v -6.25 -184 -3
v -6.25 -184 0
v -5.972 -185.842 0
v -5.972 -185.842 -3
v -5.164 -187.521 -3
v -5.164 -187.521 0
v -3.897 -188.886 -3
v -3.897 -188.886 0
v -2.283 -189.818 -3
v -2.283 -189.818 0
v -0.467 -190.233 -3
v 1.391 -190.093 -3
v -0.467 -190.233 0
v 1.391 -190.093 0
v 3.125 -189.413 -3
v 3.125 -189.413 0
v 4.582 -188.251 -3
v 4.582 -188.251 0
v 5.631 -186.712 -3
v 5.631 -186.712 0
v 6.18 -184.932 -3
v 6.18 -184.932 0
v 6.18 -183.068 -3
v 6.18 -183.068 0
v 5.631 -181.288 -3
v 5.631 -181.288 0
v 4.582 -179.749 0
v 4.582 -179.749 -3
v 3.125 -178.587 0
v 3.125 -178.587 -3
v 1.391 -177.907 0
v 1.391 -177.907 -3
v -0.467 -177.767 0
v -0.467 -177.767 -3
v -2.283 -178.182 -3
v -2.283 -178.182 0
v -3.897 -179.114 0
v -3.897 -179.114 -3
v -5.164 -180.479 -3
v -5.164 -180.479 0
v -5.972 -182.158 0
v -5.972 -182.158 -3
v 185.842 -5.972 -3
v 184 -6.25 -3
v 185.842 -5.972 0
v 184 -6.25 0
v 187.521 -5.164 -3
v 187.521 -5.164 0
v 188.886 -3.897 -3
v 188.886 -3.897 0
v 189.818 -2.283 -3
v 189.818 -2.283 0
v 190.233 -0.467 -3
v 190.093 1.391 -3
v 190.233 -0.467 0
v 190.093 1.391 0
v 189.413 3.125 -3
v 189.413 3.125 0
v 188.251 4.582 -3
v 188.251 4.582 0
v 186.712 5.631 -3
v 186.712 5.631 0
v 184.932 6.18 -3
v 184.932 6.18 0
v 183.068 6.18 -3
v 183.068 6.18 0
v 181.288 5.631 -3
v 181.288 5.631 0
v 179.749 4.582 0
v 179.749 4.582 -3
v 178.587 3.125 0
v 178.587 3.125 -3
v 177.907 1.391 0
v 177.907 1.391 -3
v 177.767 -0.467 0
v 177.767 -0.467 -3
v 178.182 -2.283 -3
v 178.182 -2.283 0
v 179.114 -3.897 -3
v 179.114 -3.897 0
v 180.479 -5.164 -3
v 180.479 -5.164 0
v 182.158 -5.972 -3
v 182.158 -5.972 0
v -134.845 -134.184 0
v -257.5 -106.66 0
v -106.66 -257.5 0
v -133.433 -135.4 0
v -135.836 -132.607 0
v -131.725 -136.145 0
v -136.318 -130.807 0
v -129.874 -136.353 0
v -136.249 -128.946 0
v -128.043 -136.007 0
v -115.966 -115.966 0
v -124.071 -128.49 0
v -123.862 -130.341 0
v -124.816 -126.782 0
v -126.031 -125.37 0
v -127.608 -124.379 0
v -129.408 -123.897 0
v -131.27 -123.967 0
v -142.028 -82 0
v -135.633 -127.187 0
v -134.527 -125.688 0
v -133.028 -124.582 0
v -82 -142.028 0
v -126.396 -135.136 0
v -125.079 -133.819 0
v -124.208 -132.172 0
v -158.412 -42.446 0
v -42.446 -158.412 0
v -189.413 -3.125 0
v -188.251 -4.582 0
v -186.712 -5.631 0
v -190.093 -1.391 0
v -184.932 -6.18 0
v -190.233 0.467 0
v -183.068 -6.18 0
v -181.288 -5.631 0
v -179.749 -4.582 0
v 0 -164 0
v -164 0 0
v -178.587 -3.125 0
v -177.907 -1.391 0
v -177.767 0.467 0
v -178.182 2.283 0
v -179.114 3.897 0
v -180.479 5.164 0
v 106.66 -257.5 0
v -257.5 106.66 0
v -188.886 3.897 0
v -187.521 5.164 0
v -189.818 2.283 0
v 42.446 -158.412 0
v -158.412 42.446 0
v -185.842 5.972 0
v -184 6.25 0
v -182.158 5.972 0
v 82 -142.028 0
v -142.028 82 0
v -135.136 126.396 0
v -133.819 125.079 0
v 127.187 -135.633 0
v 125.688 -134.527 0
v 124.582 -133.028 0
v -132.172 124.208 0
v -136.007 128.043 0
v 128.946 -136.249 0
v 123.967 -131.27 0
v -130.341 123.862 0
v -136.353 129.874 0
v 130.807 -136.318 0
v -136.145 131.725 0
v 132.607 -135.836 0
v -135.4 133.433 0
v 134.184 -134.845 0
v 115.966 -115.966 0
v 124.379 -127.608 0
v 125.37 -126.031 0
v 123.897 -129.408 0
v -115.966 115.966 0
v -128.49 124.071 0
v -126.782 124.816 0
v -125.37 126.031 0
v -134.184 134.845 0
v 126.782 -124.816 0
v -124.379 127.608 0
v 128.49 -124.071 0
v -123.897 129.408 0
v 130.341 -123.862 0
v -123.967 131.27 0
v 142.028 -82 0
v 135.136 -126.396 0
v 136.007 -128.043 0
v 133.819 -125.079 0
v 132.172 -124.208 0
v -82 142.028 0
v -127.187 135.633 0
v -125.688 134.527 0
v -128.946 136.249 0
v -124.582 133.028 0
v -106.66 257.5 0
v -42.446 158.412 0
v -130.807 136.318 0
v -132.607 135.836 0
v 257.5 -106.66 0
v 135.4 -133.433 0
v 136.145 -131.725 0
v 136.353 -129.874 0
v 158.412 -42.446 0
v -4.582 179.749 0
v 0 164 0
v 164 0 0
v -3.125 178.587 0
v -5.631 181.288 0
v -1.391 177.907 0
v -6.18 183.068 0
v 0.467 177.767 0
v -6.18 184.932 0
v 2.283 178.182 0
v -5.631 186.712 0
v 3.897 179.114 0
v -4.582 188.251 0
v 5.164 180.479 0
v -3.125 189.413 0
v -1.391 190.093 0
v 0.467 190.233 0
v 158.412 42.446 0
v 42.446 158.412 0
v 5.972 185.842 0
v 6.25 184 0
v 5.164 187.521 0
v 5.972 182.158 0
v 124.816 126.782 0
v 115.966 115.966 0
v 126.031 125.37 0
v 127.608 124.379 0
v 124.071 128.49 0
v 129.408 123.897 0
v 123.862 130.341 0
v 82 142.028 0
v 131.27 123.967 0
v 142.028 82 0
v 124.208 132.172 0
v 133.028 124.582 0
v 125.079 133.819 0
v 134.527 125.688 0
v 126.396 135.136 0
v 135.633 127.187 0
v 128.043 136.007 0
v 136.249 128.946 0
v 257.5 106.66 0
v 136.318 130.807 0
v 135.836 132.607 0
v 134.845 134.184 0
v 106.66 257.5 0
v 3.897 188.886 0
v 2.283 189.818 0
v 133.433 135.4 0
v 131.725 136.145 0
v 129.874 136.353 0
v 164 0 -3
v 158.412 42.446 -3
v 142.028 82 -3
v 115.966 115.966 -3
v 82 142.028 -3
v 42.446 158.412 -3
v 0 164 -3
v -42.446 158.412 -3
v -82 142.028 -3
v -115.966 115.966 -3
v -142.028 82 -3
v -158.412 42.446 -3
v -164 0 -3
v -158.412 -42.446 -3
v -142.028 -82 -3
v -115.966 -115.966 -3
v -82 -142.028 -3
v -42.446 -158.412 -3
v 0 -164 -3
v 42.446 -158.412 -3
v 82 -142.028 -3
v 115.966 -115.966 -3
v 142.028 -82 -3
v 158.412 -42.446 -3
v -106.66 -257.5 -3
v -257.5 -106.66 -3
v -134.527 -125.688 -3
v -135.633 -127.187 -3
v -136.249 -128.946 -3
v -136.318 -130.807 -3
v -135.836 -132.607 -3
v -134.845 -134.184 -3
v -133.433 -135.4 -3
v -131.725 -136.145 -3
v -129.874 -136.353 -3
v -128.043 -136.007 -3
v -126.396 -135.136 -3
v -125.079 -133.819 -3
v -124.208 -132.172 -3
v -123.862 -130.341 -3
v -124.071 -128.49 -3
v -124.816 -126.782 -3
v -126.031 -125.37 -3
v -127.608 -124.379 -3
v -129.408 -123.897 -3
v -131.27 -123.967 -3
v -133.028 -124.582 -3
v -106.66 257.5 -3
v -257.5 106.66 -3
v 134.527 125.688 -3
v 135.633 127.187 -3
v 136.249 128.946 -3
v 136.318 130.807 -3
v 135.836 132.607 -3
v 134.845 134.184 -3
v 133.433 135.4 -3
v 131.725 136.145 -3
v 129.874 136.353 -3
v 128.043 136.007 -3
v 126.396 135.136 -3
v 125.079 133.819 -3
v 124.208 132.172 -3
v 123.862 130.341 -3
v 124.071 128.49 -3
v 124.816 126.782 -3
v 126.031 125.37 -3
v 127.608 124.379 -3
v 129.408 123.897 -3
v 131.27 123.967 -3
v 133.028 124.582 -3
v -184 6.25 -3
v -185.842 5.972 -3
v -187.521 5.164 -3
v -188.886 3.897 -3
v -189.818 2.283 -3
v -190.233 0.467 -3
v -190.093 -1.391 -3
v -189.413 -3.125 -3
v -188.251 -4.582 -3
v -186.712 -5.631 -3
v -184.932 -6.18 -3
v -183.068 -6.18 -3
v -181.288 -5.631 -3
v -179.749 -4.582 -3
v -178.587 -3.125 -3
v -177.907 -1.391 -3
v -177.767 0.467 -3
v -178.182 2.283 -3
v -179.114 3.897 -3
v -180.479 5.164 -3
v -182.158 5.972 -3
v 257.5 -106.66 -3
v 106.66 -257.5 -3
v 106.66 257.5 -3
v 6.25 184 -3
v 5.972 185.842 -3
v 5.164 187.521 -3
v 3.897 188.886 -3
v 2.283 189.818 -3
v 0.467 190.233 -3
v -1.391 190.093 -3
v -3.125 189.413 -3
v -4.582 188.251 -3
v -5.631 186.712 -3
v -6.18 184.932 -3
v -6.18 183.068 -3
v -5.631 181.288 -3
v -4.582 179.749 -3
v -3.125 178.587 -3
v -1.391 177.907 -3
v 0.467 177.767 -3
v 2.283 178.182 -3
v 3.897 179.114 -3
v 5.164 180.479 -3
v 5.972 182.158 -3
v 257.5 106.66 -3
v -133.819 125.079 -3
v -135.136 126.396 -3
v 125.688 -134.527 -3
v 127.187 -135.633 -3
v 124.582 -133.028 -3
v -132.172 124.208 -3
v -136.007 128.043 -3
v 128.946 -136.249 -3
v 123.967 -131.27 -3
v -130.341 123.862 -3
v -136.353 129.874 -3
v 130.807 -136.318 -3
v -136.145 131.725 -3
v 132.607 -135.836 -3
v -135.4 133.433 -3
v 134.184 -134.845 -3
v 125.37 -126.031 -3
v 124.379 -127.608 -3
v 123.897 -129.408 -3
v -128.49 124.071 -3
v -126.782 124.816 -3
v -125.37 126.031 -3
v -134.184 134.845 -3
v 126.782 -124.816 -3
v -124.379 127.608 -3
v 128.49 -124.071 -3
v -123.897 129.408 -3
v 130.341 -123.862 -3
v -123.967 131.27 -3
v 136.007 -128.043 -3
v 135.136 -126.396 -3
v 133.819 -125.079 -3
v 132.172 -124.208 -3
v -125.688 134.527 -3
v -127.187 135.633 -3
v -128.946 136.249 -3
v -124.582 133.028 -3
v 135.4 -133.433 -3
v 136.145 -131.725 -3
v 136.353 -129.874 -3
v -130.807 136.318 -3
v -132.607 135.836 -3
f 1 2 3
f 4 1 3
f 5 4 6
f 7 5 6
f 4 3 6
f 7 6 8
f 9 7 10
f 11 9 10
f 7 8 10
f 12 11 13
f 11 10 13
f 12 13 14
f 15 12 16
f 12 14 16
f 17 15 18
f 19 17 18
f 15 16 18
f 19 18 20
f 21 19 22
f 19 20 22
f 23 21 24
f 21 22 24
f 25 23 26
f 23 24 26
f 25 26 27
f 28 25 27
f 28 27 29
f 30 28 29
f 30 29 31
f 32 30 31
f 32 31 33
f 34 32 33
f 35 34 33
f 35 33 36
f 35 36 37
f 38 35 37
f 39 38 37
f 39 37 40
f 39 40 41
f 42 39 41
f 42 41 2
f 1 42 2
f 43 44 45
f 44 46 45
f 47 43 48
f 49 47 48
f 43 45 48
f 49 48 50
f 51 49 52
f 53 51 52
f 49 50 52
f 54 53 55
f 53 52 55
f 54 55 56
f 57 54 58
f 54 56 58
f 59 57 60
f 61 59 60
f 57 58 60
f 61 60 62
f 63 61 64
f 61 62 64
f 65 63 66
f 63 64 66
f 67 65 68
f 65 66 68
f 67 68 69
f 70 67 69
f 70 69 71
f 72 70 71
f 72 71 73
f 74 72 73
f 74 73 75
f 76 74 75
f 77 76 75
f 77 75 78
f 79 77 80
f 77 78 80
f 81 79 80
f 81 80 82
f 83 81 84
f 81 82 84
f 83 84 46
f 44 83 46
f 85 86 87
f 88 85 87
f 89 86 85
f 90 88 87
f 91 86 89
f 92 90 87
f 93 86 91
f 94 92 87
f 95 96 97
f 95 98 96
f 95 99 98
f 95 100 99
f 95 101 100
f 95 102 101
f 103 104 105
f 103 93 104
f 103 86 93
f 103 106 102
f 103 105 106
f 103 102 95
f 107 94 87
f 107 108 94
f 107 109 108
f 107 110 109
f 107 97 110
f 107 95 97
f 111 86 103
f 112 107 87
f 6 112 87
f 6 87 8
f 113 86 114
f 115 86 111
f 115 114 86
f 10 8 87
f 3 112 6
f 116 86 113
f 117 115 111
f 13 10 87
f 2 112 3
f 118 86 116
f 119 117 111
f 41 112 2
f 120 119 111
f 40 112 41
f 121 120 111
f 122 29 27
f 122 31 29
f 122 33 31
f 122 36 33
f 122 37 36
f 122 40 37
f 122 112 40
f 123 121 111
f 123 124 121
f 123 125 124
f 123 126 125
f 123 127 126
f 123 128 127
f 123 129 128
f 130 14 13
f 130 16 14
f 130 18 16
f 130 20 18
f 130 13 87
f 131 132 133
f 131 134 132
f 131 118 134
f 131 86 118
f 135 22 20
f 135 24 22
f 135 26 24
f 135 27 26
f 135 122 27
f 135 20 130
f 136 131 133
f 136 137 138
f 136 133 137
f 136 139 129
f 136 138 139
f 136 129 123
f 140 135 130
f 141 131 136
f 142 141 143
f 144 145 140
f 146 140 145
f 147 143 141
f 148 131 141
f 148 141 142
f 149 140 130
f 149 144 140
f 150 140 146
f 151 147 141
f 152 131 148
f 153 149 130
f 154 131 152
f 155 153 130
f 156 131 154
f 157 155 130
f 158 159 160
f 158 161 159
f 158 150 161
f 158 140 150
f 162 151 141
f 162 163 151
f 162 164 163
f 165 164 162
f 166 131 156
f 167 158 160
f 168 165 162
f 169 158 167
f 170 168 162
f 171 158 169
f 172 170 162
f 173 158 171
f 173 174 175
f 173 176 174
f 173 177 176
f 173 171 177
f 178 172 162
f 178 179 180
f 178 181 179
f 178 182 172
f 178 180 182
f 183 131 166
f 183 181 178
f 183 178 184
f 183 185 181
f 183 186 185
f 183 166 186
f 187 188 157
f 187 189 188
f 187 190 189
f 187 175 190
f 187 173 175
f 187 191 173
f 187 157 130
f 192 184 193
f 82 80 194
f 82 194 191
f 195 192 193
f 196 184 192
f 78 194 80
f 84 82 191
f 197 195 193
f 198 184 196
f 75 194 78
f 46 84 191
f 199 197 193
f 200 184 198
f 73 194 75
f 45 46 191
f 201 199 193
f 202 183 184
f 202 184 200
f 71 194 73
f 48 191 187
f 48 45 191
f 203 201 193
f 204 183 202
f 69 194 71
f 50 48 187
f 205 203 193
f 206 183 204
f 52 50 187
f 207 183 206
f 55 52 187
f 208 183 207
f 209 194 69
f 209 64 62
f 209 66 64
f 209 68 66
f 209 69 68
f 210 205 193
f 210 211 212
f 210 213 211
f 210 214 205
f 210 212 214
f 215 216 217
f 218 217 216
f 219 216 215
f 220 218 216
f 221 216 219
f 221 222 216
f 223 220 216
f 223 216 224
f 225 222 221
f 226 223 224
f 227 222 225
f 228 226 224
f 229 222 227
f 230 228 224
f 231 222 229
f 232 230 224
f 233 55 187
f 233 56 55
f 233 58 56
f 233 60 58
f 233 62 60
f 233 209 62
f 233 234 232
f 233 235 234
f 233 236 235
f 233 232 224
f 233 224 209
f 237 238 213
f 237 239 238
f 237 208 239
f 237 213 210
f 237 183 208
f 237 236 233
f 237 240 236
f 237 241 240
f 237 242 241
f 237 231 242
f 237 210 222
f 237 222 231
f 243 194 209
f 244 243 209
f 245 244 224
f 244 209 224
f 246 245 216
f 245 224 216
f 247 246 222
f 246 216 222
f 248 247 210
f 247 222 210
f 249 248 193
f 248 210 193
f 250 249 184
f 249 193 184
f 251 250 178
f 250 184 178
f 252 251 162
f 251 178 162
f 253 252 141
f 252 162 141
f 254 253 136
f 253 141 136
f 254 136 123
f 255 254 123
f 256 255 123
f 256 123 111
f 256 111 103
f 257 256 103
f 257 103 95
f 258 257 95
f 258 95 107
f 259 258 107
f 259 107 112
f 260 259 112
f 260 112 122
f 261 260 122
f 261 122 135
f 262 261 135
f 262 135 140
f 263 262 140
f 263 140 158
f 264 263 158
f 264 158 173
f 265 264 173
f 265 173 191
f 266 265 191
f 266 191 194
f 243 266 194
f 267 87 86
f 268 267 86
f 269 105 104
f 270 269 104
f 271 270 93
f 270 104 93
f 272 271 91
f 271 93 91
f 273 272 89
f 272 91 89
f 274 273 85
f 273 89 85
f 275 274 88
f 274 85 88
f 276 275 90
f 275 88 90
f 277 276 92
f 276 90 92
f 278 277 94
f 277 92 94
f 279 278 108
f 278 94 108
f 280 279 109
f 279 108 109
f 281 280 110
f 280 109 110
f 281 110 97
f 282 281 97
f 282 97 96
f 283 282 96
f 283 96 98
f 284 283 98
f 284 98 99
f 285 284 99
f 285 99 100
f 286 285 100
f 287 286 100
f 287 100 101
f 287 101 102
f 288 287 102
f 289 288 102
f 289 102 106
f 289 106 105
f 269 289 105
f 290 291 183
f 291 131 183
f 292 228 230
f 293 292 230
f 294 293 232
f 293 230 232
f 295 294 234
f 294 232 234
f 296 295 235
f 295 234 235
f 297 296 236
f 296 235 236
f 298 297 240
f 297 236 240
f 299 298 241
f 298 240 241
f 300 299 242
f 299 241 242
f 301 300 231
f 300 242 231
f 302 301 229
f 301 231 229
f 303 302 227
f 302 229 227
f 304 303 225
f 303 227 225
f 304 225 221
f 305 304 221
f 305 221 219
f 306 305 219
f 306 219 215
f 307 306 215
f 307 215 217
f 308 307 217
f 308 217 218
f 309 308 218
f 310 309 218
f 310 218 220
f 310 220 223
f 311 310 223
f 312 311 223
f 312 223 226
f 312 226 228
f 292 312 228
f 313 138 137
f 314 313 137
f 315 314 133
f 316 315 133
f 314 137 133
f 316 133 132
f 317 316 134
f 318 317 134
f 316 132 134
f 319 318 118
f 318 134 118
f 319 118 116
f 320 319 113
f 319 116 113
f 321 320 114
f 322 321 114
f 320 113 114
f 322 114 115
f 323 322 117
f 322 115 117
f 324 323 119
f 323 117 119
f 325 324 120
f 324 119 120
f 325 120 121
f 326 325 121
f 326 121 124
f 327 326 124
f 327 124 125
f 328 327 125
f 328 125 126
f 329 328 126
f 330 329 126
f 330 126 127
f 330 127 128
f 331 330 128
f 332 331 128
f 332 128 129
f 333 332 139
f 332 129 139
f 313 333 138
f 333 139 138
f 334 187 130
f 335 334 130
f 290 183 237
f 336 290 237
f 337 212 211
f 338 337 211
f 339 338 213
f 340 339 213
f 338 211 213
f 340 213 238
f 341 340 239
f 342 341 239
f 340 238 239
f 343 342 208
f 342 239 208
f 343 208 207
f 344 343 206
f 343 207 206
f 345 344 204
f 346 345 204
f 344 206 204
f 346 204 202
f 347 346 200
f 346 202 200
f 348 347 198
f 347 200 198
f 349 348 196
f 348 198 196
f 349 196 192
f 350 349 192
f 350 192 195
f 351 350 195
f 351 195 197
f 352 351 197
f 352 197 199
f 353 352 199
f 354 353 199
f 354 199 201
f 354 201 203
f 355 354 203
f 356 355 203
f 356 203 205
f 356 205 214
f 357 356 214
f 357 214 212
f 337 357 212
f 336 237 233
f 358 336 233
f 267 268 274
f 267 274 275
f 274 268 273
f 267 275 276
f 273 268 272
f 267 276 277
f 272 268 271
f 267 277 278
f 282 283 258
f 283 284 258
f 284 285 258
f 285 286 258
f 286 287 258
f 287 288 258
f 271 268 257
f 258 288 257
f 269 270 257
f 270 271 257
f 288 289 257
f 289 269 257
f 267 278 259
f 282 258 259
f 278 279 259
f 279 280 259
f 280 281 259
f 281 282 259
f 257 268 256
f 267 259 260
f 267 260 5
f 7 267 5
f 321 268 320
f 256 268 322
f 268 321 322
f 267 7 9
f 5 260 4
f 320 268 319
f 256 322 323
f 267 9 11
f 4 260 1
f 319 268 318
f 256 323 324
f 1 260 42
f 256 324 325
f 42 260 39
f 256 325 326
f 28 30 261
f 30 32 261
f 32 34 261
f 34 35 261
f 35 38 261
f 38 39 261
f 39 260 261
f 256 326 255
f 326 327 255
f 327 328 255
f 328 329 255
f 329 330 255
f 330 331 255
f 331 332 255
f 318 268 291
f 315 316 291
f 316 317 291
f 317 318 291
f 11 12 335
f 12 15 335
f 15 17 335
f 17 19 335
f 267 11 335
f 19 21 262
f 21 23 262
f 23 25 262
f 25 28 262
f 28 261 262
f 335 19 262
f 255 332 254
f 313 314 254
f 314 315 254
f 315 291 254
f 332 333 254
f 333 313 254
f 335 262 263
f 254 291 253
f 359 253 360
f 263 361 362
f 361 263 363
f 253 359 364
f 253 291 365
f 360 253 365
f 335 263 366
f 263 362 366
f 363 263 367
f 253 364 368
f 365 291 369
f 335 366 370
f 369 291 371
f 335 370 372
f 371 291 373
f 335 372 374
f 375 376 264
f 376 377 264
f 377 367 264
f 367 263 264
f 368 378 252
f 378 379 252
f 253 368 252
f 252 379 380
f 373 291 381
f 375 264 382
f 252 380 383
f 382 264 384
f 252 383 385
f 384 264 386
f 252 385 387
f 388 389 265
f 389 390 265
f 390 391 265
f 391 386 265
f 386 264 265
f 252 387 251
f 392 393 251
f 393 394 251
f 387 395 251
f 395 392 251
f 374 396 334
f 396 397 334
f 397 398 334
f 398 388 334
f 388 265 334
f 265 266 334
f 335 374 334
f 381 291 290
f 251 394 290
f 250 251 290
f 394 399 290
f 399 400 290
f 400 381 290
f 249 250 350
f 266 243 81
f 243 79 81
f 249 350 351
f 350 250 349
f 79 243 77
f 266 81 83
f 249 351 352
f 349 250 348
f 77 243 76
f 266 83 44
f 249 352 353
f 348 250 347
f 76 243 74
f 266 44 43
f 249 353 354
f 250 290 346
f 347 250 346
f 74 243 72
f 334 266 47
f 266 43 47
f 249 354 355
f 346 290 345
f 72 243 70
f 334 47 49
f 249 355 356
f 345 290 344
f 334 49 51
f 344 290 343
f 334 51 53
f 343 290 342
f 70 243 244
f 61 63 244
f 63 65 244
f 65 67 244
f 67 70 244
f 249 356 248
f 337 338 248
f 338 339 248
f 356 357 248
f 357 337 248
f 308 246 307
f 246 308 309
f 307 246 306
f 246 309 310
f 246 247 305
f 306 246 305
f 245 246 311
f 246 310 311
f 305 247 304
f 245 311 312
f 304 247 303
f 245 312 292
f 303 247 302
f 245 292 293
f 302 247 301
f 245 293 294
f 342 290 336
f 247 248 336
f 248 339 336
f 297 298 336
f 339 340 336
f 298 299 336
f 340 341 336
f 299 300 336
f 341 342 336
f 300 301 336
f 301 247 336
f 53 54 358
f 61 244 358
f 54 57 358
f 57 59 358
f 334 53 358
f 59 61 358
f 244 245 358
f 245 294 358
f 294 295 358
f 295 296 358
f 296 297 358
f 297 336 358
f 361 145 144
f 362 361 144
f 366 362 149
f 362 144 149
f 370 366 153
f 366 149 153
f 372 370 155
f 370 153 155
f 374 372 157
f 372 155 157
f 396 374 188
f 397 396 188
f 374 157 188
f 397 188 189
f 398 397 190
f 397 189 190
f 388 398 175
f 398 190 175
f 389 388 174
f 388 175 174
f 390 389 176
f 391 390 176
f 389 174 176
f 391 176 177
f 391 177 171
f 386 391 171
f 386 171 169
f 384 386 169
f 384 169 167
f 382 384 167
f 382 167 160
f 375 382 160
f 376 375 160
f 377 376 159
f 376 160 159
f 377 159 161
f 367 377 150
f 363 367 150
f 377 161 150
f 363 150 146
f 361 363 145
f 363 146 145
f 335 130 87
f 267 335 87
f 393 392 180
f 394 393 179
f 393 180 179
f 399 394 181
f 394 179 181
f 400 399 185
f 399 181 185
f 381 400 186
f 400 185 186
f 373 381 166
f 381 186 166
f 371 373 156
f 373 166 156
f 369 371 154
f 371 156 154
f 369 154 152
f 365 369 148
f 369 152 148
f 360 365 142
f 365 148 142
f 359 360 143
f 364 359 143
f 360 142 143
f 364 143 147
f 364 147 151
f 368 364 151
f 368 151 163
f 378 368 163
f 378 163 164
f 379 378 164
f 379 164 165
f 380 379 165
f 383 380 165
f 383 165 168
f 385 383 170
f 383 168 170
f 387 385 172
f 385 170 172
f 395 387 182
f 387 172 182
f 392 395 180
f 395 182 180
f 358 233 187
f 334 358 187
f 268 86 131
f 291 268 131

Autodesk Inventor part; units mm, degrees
ref_plane "YZ Plane" through (0, 0, 0) normal (1, 0, 0) x (0, 1, 0)
ref_plane "XZ Plane" through (0, 0, 0) normal (0, 1, 0) x (-1, 0, 0)
ref_plane "XY Plane" through (0, 0, 0) normal (0, 0, 1) x (1, 0, 0)
sketch "Sketch2" plane through (0, 0, 0) normal (0, 0, 1) x (1, 0, 0)
  line L0 (-257.5, 106.66) -> (-106.66, 257.5)
  line L1 (-106.66, 257.5) -> (106.66, 257.5)
  line L2 (106.66, 257.5) -> (257.5, 106.66)
  line L3 (257.5, 106.66) -> (257.5, -106.66)
  line L4 (257.5, -106.66) -> (106.66, -257.5)
  line L5 (106.66, -257.5) -> (-106.66, -257.5)
  line L6 (-106.66, -257.5) -> (-257.5, -106.66)
  line L7 (-257.5, -106.66) -> (-257.5, 106.66)
  circle A0 centre (0, 0) radius 164
  point P0 (0, 257.5)
  dimension "d23" = 515
  dimension "d26" = 328
extrude "Plate1" add sketch "Sketch2" against normal blind 3
sketch "Sketch4" plane through (0, 0, 0) normal (0, 0, 1) x (1, 0, 0)
  circle A0 centre (0, 184) radius 6.25
  circle A1 centre (0, 0) radius 164 projected
  dimension "d16" = 12.5
  dimension "d17" = 184
extrude "Extrusion1" cut sketch "Sketch4" against normal up to surface (3 mm away) contours A0
pattern_circular "Circular Pattern1" count 8 over 360 about axis through (0, 0, -10) along (0, 0, 1) of "Extrusion1"
equation "\"d23\" = Барабан_размер_по_плоскостям"
equation "\"d15\" = Thickness"
equation "\"BendRadius\" = Thickness"
equation "\"BendReliefWidth\" = Thickness"
equation "\"BendReliefDepth\" = 0.5 * Thickness"
equation "\"CornerReliefSize\" = 4 * Thickness"
equation "\"MinimumRemnant\" = 2 * Thickness"
equation "\"TransitionRadius\" = BendRadius"
equation "\"JacobiRadiusSize\" = BendRadius"
equation "\"GapSize\" = Thickness"
equation "\"Барабан_размер_по_плоскостям\" = 515"
equation "\"Thickness\" = 3"
properties part number "DMF 01 22 Барабан торец КОРМА v2.1"
